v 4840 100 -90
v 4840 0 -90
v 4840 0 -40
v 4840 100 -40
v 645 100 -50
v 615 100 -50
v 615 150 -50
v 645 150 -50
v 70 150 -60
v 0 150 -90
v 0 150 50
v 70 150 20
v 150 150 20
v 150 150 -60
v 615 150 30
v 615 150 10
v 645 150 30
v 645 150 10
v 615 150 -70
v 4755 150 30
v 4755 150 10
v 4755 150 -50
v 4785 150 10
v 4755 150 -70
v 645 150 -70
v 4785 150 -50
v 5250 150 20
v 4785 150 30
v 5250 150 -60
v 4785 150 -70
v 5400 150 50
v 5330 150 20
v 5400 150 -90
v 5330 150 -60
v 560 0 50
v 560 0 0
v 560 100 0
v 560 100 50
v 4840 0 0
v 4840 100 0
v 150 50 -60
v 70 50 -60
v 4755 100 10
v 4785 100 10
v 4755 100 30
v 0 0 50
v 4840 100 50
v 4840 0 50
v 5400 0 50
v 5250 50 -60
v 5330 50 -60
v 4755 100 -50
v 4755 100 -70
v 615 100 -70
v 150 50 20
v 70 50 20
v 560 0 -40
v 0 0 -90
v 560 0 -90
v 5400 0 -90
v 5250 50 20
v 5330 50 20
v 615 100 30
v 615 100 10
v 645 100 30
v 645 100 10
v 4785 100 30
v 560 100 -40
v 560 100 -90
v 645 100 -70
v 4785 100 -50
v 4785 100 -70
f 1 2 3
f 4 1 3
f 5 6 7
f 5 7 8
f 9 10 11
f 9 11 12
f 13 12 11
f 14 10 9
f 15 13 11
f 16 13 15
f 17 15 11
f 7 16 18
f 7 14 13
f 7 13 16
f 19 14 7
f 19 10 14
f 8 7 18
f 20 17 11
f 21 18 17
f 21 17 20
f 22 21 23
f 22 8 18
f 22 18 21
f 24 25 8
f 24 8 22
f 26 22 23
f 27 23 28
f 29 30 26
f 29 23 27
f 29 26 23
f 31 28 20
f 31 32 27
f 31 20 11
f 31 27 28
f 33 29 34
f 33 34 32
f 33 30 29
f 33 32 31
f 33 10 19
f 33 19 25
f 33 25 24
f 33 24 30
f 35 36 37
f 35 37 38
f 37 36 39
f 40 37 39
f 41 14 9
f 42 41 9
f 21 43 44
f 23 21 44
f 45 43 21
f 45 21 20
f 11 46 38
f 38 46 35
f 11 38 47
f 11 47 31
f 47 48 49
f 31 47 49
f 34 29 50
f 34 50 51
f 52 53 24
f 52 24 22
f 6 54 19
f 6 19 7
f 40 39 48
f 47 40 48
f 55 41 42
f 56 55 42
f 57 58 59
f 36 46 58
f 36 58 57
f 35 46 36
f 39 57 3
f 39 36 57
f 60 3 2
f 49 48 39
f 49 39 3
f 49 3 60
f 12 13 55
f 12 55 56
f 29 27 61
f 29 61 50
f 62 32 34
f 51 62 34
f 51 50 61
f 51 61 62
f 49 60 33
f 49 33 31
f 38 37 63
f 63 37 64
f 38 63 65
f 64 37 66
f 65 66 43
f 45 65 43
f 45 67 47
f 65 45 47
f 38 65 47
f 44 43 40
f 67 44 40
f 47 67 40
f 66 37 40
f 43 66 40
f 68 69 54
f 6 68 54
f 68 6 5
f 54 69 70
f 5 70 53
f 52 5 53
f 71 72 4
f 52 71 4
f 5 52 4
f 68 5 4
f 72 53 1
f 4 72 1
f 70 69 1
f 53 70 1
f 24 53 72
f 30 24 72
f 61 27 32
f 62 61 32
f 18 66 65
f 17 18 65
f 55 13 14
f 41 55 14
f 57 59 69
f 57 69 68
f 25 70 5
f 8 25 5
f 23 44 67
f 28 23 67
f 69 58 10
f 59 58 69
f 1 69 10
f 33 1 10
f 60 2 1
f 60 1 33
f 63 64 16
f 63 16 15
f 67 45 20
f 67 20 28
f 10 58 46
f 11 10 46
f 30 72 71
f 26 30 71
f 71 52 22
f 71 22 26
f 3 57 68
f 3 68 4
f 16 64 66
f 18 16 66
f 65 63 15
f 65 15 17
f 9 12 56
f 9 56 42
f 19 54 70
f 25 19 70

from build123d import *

# Parameters (mm, degrees)
SKETCH_1_W             = 5400
SKETCH_1_H             = 40
EXTRUDE_1_DEPTH        = 100
SKETCH_2_W             = 5400
SKETCH_2_H             = 140
EXTRUDE_2_DEPTH        = 50
SKETCH_3_W             = 30
SKETCH_3_H             = 20
CUT_EXTRUDE_1_DEPTH    = 51
PATTERN_LINEAR_1_COUNT = 2
PATTERN_LINEAR_1_PITCH = 4140
SKETCH_4_W             = 560
SKETCH_4_H             = 140
EXTRUDE_3_DEPTH        = 100
PATTERN_LINEAR_2_COUNT = 2
PATTERN_LINEAR_2_PITCH = 4840
SKETCH_5_W             = 80
SKETCH_5_H             = 80
CUT_EXTRUDE_2_DEPTH    = 100


with BuildPart() as part:
    # 草图1 → 凸台-拉伸1 (new body)
    with BuildSketch(Plane(origin=(0, 0, 0), x_dir=(1, 0, 0), z_dir=(0, 1, 0))):
        with Locations((2700, 20)):
            Rectangle(SKETCH_1_W, SKETCH_1_H)
    extrude(amount=EXTRUDE_1_DEPTH)

    # 草图2 → 凸台-拉伸2 (add)
    with BuildSketch(Plane(origin=(0, 100, 0), x_dir=(1, 0, 0), z_dir=(0, 1, 0))):
        with Locations((2700, 20)):
            Rectangle(SKETCH_2_W, SKETCH_2_H)
    extrude(amount=EXTRUDE_2_DEPTH)

    # 草图3 → 切除-拉伸1 (cut, through all)
    with BuildSketch(Plane.XZ.offset(-100)):
        with Locations((630, -60)):
            Rectangle(SKETCH_3_W, SKETCH_3_H)
        with Locations((630, 20)):
            Rectangle(SKETCH_3_W, SKETCH_3_H)
    cut_extrude_1 = extrude(amount=-CUT_EXTRUDE_1_DEPTH, mode=Mode.SUBTRACT)

    # 阵列(线性)1: 切除-拉伸1 ×2
    with Locations(*[(i * PATTERN_LINEAR_1_PITCH, 0, 0) for i in range(1, PATTERN_LINEAR_1_COUNT)]):
        add(cut_extrude_1, mode=Mode.SUBTRACT)

    # 草图4 → 凸台-拉伸3 (add)
    with BuildSketch(Plane.XZ):
        with Locations((5120, -20)):
            Rectangle(SKETCH_4_W, SKETCH_4_H)
    extrude_3 = extrude(amount=-EXTRUDE_3_DEPTH)

    # 阵列(线性)2: 凸台-拉伸3 ×2
    with Locations(*[(-i * PATTERN_LINEAR_2_PITCH, 0, 0) for i in range(1, PATTERN_LINEAR_2_COUNT)]):
        add(extrude_3)

    # 草图5 → 切除-拉伸2 (cut)
    with BuildSketch(Plane(origin=(0, 150, 0), x_dir=(1, 0, 0), z_dir=(0, 1, 0))):
        with Locations((5290, 20)):
            Rectangle(SKETCH_5_W, SKETCH_5_H)
    cut_extrude_2 = extrude(amount=-CUT_EXTRUDE_2_DEPTH, mode=Mode.SUBTRACT)

    # 镜向1: 切除-拉伸2 across plane
    add(cut_extrude_2.mirror(Plane(origin=(2700, 0, 0), x_dir=(0, 0, 1), z_dir=(1, 0, 0))), mode=Mode.SUBTRACT)


solid = part.part
